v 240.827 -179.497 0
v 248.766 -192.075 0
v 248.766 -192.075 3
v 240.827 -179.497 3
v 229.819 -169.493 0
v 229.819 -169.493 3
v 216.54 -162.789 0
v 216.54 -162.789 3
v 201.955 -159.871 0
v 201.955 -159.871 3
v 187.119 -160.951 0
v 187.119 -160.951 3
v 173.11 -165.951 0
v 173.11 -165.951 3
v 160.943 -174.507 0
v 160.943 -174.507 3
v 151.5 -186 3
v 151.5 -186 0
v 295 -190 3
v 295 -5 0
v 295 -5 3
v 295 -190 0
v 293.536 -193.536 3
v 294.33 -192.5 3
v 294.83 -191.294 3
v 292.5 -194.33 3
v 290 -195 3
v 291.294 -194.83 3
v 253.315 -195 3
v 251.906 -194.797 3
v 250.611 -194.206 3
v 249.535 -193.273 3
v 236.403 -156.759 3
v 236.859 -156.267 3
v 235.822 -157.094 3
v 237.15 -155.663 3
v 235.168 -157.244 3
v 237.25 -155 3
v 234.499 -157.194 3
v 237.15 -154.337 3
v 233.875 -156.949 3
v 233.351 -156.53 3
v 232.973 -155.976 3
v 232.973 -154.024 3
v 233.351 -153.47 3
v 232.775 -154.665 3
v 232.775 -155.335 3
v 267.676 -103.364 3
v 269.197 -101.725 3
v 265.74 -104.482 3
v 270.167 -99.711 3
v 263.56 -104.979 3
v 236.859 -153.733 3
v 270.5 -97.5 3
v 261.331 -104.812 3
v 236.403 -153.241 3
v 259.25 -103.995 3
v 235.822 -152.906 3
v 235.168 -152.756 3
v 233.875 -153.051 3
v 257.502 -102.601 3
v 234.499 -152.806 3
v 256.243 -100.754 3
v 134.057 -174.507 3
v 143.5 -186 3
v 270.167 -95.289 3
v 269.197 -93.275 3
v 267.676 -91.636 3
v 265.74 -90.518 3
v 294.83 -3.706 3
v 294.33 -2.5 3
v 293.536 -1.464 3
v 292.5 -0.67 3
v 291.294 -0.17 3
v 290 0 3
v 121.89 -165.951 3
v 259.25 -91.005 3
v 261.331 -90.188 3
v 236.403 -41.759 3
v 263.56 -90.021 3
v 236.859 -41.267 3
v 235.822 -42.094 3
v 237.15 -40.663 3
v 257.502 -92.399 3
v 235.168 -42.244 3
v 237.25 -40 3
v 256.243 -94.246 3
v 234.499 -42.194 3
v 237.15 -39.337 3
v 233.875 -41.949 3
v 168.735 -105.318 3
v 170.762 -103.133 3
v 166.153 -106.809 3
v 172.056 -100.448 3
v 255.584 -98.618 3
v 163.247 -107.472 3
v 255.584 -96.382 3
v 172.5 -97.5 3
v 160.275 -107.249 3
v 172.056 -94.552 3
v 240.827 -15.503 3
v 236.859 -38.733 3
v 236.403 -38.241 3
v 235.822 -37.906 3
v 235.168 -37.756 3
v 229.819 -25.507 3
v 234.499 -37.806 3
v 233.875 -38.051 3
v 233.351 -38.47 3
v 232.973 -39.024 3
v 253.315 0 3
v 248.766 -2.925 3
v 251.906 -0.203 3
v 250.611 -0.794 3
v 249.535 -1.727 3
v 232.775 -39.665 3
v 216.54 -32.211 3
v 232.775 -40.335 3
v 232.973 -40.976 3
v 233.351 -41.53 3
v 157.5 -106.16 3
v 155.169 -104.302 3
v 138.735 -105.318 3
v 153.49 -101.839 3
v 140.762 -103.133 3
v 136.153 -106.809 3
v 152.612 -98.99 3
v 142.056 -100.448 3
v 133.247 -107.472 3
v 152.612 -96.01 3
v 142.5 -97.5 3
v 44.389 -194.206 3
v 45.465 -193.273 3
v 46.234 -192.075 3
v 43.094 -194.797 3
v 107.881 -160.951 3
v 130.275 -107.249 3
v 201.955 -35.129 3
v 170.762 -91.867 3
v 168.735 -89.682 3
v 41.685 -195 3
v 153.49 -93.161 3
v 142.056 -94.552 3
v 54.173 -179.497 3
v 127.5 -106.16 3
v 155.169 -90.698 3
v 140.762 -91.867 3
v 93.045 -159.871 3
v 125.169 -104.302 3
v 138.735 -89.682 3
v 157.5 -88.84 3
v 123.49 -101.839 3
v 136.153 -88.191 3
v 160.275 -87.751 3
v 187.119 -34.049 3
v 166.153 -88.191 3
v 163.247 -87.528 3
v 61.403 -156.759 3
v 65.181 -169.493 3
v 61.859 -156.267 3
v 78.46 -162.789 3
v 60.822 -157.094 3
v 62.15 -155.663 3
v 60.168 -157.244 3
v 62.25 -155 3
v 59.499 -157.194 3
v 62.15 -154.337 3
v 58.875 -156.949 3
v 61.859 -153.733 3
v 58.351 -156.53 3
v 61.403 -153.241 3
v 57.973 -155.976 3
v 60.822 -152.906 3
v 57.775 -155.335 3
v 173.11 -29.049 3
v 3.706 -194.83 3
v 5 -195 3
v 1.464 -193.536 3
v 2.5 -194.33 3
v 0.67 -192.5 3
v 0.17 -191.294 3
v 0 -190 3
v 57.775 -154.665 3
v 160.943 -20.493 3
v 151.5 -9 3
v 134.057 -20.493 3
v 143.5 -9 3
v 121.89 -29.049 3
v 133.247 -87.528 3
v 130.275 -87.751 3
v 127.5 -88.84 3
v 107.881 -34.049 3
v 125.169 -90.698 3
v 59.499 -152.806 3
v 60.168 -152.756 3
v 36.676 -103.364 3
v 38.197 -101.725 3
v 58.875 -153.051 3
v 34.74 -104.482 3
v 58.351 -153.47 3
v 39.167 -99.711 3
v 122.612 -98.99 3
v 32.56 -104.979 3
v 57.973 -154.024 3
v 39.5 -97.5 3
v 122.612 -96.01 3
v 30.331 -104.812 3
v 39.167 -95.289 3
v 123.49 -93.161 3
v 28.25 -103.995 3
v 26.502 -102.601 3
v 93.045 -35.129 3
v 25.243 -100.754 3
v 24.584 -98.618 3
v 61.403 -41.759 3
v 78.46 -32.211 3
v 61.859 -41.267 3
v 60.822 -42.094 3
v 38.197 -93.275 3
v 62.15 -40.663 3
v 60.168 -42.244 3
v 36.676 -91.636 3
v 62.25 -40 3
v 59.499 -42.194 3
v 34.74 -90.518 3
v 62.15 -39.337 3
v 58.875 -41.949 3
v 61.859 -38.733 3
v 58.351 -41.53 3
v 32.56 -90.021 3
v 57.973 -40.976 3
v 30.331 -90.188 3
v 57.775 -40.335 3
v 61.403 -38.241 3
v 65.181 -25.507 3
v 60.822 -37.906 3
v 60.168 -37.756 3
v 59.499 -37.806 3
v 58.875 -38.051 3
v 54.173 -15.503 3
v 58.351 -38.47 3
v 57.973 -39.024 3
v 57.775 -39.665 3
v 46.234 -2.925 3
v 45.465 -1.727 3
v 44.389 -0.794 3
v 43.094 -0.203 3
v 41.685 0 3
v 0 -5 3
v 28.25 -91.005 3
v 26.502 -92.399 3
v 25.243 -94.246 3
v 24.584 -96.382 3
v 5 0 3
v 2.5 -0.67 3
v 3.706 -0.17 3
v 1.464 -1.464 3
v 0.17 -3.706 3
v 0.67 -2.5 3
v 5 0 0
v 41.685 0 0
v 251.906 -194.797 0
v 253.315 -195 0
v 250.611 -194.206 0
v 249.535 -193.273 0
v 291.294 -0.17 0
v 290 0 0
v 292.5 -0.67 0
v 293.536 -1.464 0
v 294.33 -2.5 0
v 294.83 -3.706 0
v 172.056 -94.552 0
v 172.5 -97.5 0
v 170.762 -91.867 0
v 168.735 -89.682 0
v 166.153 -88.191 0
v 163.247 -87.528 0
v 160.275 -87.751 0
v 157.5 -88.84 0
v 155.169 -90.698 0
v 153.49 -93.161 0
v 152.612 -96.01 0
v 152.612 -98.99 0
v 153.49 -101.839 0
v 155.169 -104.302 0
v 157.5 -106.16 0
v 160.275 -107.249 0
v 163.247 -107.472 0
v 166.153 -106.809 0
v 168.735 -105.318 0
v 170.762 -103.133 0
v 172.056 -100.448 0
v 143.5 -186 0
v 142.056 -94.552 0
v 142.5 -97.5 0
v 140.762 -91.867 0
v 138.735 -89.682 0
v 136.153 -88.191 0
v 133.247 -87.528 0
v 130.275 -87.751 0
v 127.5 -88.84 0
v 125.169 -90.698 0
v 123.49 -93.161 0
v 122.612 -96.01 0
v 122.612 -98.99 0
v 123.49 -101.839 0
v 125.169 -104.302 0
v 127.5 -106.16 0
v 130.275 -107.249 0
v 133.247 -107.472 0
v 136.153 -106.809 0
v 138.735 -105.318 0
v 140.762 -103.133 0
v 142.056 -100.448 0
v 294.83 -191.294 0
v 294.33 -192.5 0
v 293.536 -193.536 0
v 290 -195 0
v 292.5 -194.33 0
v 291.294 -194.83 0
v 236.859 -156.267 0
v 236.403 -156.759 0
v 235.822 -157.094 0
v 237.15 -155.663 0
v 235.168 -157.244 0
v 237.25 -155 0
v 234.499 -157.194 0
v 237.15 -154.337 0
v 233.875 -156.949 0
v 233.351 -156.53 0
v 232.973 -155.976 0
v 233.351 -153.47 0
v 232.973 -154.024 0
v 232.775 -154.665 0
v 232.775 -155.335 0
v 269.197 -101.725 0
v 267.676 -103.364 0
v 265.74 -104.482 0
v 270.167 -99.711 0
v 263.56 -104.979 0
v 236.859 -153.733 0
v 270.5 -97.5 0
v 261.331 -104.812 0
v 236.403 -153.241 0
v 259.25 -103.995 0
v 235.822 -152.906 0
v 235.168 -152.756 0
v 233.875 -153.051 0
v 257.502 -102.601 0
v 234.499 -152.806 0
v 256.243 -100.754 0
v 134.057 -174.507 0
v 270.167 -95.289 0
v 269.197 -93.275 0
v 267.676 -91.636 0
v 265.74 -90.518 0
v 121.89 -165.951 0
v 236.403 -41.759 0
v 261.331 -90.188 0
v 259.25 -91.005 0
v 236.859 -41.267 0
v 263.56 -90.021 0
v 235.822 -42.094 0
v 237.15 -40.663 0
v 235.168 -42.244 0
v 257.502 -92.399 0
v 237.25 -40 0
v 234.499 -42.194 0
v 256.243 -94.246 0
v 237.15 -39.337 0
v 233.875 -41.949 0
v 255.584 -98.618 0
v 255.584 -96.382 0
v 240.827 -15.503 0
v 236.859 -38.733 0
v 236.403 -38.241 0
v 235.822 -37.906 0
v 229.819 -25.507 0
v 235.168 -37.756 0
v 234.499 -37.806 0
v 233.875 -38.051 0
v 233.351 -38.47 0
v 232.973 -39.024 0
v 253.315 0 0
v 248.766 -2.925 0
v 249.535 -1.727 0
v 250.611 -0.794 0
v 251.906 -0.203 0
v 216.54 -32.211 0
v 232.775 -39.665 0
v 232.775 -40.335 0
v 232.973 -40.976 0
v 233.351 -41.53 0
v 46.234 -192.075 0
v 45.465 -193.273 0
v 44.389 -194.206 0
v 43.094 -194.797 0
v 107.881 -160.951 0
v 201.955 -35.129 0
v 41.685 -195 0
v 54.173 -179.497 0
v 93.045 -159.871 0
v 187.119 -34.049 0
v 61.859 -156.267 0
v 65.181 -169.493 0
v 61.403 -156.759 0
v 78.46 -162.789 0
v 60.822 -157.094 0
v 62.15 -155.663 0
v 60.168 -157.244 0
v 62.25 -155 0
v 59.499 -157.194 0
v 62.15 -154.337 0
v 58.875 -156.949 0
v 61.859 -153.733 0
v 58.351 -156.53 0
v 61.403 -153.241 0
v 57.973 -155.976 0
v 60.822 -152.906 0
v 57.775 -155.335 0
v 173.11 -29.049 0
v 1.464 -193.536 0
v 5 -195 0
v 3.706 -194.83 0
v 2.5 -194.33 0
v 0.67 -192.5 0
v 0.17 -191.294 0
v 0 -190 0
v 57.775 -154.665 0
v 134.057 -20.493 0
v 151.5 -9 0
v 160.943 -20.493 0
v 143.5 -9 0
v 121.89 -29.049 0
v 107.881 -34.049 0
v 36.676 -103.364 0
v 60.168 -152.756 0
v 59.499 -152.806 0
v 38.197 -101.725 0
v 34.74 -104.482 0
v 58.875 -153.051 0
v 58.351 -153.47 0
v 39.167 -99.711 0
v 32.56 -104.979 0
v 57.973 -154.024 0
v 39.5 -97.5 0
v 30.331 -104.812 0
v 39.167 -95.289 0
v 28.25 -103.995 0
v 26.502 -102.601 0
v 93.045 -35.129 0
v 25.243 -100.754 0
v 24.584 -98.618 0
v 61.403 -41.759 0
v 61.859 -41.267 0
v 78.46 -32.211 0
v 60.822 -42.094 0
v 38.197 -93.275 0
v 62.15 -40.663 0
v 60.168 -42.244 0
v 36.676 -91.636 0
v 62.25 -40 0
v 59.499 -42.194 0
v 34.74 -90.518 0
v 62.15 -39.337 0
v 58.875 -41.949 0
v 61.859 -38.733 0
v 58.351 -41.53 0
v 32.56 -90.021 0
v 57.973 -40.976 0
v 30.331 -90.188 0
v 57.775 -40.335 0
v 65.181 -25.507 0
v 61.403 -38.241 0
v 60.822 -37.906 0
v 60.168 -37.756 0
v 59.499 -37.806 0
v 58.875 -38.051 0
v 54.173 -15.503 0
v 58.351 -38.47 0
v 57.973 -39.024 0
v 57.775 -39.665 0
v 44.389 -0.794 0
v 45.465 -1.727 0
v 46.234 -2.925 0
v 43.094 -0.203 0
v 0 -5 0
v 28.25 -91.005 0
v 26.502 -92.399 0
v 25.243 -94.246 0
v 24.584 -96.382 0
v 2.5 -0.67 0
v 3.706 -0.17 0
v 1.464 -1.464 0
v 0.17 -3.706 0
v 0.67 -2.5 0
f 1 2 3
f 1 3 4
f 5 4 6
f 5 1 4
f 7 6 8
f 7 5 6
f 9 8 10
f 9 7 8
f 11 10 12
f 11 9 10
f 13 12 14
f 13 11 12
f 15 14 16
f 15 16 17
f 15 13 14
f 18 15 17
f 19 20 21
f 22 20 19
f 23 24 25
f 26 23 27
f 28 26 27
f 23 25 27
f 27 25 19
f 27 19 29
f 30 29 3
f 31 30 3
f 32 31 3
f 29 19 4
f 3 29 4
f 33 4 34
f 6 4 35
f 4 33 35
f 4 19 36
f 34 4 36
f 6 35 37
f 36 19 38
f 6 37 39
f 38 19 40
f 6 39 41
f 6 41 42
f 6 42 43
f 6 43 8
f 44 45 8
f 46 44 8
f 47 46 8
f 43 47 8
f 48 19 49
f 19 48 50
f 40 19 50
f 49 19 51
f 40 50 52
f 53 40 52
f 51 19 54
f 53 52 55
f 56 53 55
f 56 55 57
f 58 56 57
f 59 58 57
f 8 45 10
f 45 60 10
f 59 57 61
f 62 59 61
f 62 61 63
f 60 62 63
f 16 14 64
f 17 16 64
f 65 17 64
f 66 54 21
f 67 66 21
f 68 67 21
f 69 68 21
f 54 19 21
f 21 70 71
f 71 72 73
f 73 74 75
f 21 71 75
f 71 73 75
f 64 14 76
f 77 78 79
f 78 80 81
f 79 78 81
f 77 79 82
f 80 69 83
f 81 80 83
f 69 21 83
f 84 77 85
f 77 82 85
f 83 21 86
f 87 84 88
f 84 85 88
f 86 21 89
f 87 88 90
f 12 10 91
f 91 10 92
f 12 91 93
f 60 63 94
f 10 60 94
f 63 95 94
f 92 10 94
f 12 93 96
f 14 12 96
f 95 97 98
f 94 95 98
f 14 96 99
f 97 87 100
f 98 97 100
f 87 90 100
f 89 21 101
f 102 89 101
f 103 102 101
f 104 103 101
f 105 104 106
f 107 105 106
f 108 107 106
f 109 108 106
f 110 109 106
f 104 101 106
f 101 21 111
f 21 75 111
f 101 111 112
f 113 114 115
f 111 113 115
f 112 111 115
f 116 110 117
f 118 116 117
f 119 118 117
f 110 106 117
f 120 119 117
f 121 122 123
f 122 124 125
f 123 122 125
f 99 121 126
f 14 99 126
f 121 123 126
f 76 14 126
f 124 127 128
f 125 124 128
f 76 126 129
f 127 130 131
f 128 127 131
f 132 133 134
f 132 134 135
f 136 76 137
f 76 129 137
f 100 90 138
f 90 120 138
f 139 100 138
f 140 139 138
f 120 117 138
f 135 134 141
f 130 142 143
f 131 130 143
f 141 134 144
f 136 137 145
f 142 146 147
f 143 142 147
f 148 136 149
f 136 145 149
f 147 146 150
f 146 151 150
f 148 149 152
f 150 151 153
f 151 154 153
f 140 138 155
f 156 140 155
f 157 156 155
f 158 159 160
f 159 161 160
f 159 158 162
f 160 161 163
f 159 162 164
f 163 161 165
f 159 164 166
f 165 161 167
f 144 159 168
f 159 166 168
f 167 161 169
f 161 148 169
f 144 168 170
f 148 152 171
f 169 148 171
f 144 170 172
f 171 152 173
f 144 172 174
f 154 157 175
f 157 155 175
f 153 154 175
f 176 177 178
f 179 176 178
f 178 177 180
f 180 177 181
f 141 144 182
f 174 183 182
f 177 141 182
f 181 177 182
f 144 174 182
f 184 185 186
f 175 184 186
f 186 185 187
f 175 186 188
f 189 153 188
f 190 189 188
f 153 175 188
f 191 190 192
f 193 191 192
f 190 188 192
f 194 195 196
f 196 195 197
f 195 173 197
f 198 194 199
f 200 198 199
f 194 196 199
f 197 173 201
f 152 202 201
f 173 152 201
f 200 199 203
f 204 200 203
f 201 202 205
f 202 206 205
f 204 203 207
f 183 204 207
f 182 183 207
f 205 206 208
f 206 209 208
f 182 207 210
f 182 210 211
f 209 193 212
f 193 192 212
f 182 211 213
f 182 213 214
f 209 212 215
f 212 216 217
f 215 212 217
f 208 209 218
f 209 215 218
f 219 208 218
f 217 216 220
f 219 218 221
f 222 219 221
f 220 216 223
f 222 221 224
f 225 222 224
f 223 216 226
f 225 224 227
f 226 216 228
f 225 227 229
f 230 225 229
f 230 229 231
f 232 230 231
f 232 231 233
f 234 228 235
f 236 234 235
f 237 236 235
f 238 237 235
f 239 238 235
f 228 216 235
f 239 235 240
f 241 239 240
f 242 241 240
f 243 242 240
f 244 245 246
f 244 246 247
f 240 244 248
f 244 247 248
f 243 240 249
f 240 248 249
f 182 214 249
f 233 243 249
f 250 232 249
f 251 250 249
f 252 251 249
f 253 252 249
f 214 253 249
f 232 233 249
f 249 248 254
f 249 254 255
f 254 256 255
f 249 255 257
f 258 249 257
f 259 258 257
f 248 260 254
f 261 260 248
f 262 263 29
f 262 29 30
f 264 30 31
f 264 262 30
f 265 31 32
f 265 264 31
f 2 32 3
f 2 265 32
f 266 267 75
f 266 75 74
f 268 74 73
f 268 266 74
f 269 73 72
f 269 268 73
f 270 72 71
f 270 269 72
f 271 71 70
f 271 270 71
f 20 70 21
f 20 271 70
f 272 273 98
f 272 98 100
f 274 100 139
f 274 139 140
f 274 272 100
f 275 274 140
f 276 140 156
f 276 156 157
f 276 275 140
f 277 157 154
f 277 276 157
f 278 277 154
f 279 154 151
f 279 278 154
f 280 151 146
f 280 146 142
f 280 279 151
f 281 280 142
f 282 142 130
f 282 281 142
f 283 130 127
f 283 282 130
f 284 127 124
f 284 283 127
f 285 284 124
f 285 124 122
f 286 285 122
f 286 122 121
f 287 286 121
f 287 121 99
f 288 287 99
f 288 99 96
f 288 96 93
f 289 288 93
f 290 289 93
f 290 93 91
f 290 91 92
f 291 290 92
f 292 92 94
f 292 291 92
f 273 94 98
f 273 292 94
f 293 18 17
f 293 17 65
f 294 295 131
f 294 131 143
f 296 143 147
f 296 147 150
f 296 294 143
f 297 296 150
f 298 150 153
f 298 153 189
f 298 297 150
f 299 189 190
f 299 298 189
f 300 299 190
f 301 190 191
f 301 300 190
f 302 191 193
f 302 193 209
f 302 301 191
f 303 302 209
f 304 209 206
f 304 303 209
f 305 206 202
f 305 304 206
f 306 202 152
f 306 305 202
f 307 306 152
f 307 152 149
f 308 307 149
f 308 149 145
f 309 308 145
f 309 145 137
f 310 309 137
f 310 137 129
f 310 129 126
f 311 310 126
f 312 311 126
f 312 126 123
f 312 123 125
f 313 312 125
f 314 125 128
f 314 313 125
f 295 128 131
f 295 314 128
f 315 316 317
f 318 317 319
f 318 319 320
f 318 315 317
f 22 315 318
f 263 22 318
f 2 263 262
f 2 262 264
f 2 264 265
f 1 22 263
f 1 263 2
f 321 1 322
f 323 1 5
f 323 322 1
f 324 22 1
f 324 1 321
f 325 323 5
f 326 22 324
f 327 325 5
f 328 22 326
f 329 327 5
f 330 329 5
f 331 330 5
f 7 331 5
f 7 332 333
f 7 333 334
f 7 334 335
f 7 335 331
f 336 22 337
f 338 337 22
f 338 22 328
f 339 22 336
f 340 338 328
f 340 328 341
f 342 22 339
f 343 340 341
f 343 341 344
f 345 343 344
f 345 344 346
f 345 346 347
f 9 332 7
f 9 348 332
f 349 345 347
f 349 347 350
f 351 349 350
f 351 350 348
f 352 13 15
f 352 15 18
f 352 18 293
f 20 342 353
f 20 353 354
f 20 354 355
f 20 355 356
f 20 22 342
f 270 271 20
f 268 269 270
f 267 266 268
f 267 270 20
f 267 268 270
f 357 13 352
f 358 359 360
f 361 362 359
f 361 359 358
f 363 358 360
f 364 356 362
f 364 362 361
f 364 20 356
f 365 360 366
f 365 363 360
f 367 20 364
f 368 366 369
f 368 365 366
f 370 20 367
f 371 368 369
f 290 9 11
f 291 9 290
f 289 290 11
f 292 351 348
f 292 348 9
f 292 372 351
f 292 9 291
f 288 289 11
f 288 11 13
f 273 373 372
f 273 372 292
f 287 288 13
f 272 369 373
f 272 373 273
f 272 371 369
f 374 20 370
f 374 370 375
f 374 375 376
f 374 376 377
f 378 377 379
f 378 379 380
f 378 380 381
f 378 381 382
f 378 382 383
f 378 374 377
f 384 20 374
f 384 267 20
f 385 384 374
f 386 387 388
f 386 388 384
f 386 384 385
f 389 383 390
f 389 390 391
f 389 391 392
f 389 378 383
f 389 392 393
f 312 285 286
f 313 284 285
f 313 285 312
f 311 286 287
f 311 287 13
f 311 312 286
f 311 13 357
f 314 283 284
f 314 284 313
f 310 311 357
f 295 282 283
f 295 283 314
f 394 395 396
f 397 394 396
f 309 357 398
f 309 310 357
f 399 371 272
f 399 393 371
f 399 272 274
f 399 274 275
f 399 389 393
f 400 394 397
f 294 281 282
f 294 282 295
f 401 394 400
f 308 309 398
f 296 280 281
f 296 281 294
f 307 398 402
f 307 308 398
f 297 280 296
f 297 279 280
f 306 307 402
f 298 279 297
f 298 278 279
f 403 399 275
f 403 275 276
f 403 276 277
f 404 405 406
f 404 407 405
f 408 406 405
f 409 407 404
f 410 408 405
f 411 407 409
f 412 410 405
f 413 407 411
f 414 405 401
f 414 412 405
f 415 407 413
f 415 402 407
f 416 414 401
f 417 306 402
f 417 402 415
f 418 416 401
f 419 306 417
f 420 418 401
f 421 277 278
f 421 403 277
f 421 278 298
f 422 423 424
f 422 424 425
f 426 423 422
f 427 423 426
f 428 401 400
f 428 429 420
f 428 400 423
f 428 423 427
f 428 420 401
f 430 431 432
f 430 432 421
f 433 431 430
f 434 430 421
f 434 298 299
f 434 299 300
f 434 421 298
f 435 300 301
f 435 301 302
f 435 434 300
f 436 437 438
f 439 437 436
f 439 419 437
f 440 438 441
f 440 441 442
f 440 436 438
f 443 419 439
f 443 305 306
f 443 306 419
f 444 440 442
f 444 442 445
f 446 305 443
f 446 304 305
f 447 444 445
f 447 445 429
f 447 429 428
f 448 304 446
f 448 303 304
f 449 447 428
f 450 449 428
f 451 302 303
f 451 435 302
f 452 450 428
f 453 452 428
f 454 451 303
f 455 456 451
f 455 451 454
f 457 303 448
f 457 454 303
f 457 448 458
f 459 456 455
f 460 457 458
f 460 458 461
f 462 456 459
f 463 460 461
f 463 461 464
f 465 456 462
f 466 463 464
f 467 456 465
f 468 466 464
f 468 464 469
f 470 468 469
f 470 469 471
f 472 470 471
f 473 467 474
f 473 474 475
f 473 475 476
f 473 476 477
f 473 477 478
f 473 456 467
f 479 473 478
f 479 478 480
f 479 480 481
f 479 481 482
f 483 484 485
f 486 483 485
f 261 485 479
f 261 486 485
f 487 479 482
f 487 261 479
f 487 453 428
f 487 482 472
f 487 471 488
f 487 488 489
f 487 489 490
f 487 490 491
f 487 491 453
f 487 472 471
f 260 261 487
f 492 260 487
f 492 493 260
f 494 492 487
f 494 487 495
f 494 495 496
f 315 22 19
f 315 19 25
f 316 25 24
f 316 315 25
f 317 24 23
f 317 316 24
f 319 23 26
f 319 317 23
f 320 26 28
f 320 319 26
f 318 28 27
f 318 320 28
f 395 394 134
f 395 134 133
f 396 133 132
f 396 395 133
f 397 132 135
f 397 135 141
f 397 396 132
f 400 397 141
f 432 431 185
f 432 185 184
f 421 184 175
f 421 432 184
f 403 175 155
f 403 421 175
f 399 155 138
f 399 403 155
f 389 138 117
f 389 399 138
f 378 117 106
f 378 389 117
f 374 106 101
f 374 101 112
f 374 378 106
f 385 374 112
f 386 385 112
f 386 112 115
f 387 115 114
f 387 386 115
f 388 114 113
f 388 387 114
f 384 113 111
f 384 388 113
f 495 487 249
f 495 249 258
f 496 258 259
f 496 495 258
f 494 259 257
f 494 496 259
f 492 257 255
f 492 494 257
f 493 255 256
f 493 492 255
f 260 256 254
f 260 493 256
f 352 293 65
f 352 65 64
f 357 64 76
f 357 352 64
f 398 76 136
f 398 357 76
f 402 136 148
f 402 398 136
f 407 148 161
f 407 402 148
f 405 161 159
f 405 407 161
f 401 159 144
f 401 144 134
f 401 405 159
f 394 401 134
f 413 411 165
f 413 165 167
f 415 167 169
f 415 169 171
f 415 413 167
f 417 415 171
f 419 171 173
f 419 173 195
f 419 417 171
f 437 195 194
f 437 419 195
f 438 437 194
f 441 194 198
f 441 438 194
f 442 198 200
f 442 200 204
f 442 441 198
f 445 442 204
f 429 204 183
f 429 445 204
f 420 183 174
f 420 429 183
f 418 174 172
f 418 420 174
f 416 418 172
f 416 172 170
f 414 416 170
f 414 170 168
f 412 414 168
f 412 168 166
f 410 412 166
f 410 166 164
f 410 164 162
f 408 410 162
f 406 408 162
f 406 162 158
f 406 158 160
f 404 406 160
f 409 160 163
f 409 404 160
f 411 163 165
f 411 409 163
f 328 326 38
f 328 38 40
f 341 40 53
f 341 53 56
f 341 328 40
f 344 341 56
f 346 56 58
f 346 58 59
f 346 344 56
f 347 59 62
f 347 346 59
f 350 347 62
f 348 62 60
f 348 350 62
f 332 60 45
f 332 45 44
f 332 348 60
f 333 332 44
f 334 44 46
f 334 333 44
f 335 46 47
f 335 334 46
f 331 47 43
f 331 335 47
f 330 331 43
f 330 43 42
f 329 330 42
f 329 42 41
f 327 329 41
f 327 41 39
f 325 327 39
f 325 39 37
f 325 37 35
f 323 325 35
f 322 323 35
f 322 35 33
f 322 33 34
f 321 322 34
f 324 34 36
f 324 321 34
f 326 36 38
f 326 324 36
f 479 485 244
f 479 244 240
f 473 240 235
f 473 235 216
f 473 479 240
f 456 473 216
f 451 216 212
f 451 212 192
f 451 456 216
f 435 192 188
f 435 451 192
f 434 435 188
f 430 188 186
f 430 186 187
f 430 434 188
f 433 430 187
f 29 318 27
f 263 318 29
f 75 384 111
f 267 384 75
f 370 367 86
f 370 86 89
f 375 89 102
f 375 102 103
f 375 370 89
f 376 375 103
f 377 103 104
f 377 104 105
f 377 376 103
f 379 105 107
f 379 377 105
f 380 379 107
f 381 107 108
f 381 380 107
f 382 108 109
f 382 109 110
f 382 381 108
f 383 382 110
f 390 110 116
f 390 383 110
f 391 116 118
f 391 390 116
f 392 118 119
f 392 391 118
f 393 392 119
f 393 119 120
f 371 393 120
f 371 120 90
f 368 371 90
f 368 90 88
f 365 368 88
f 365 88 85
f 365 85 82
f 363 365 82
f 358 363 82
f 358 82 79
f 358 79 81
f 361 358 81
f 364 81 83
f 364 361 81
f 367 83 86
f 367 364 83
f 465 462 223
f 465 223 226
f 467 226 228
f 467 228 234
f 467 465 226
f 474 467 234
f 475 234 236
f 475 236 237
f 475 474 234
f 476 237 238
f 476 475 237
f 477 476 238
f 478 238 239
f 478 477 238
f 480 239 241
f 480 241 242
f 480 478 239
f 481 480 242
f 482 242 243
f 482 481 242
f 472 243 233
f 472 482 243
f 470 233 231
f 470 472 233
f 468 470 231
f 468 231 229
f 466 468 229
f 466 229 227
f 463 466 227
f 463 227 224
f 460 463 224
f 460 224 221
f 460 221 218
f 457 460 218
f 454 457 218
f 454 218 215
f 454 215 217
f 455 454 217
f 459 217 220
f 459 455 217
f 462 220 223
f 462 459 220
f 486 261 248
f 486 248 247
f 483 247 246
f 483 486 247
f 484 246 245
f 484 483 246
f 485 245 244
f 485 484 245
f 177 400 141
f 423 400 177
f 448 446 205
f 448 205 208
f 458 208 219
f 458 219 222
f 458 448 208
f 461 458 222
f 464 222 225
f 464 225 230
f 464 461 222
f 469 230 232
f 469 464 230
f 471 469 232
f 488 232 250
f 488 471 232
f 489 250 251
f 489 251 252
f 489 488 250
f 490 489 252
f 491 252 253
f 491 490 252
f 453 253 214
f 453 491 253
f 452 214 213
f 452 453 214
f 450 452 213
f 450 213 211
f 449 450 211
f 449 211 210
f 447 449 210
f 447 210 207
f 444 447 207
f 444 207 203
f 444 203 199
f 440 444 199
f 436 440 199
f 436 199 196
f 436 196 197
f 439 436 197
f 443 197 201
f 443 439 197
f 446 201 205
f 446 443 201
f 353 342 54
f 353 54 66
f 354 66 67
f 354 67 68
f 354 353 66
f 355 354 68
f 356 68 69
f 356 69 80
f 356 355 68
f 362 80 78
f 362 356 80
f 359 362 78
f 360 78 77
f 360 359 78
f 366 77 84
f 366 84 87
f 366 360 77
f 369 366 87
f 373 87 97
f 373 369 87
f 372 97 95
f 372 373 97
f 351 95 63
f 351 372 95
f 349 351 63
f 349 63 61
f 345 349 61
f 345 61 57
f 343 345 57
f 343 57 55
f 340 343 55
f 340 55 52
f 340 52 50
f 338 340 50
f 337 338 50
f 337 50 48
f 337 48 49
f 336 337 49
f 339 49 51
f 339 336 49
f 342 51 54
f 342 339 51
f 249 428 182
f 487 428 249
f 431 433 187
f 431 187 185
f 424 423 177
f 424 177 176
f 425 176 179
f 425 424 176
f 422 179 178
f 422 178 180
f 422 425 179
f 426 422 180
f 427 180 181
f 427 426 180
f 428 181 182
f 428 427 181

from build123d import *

# Parameters (mm, degrees)
ESQUISSE1_R        = 2.25
ESQUISSE1_R_2      = 7.5
ESQUISSE1_R_3      = 10
BOSS_EXTRU_1_DEPTH = 3


with BuildPart() as part:
    # Esquisse1 → Boss.-Extru.1 (new body)
    with BuildSketch(Plane.XY):
        with BuildLine():
            Line((5, 0), (41.684938398, 0))
            ThreePointArc((41.684938398, 0), (44.389031178, -0.794303597), (46.23397571, -2.924847105))
            ThreePointArc((46.23397571, -2.924847105), (93.045262331, -35.129096737), (143.5, -9))
            Line((143.5, -9), (151.5, -9))
            ThreePointArc((151.5, -9), (201.954737669, -35.129096737), (248.76602429, -2.924847105))
            ThreePointArc((248.76602429, -2.924847105), (250.610968822, -0.794303597), (253.315061602, 0))
            Line((253.315061602, 0), (290, 0))
            ThreePointArc((290, 0), (293.535533906, -1.464466094), (295, -5))
            Line((295, -5), (295, -190))
            ThreePointArc((295, -190), (293.535533906, -193.535533906), (290, -195))
            Line((290, -195), (253.315061602, -195))
            ThreePointArc((253.315061602, -195), (250.610968822, -194.205696403), (248.76602429, -192.075152895))
            ThreePointArc((248.76602429, -192.075152895), (201.954737669, -159.870903263), (151.5, -186))
            Line((151.5, -186), (143.5, -186))
            ThreePointArc((143.5, -186), (93.045262331, -159.870903263), (46.23397571, -192.075152895))
            ThreePointArc((46.23397571, -192.075152895), (44.389031178, -194.205696403), (41.684938398, -195))
            Line((41.684938398, -195), (5, -195))
            ThreePointArc((5, -195), (1.464466094, -193.535533906), (0, -190))
            Line((0, -190), (0, -5))
            ThreePointArc((0, -5), (1.464466094, -1.464466094), (5, 0))
        make_face()
        with Locations((60, -40)):
            Circle(ESQUISSE1_R, mode=Mode.SUBTRACT)
        with Locations((32, -97.5)):
            Circle(ESQUISSE1_R_2, mode=Mode.SUBTRACT)
        with Locations((263, -97.5)):
            Circle(ESQUISSE1_R_2, mode=Mode.SUBTRACT)
        with Locations((132.5, -97.5)):
            Circle(ESQUISSE1_R_3, mode=Mode.SUBTRACT)
        with Locations((162.5, -97.5)):
            Circle(ESQUISSE1_R_3, mode=Mode.SUBTRACT)
        with Locations((235, -40)):
            Circle(ESQUISSE1_R, mode=Mode.SUBTRACT)
        with Locations((235, -155)):
            Circle(ESQUISSE1_R, mode=Mode.SUBTRACT)
        with Locations((60, -155)):
            Circle(ESQUISSE1_R, mode=Mode.SUBTRACT)
    extrude(amount=BOSS_EXTRU_1_DEPTH)


solid = part.part
